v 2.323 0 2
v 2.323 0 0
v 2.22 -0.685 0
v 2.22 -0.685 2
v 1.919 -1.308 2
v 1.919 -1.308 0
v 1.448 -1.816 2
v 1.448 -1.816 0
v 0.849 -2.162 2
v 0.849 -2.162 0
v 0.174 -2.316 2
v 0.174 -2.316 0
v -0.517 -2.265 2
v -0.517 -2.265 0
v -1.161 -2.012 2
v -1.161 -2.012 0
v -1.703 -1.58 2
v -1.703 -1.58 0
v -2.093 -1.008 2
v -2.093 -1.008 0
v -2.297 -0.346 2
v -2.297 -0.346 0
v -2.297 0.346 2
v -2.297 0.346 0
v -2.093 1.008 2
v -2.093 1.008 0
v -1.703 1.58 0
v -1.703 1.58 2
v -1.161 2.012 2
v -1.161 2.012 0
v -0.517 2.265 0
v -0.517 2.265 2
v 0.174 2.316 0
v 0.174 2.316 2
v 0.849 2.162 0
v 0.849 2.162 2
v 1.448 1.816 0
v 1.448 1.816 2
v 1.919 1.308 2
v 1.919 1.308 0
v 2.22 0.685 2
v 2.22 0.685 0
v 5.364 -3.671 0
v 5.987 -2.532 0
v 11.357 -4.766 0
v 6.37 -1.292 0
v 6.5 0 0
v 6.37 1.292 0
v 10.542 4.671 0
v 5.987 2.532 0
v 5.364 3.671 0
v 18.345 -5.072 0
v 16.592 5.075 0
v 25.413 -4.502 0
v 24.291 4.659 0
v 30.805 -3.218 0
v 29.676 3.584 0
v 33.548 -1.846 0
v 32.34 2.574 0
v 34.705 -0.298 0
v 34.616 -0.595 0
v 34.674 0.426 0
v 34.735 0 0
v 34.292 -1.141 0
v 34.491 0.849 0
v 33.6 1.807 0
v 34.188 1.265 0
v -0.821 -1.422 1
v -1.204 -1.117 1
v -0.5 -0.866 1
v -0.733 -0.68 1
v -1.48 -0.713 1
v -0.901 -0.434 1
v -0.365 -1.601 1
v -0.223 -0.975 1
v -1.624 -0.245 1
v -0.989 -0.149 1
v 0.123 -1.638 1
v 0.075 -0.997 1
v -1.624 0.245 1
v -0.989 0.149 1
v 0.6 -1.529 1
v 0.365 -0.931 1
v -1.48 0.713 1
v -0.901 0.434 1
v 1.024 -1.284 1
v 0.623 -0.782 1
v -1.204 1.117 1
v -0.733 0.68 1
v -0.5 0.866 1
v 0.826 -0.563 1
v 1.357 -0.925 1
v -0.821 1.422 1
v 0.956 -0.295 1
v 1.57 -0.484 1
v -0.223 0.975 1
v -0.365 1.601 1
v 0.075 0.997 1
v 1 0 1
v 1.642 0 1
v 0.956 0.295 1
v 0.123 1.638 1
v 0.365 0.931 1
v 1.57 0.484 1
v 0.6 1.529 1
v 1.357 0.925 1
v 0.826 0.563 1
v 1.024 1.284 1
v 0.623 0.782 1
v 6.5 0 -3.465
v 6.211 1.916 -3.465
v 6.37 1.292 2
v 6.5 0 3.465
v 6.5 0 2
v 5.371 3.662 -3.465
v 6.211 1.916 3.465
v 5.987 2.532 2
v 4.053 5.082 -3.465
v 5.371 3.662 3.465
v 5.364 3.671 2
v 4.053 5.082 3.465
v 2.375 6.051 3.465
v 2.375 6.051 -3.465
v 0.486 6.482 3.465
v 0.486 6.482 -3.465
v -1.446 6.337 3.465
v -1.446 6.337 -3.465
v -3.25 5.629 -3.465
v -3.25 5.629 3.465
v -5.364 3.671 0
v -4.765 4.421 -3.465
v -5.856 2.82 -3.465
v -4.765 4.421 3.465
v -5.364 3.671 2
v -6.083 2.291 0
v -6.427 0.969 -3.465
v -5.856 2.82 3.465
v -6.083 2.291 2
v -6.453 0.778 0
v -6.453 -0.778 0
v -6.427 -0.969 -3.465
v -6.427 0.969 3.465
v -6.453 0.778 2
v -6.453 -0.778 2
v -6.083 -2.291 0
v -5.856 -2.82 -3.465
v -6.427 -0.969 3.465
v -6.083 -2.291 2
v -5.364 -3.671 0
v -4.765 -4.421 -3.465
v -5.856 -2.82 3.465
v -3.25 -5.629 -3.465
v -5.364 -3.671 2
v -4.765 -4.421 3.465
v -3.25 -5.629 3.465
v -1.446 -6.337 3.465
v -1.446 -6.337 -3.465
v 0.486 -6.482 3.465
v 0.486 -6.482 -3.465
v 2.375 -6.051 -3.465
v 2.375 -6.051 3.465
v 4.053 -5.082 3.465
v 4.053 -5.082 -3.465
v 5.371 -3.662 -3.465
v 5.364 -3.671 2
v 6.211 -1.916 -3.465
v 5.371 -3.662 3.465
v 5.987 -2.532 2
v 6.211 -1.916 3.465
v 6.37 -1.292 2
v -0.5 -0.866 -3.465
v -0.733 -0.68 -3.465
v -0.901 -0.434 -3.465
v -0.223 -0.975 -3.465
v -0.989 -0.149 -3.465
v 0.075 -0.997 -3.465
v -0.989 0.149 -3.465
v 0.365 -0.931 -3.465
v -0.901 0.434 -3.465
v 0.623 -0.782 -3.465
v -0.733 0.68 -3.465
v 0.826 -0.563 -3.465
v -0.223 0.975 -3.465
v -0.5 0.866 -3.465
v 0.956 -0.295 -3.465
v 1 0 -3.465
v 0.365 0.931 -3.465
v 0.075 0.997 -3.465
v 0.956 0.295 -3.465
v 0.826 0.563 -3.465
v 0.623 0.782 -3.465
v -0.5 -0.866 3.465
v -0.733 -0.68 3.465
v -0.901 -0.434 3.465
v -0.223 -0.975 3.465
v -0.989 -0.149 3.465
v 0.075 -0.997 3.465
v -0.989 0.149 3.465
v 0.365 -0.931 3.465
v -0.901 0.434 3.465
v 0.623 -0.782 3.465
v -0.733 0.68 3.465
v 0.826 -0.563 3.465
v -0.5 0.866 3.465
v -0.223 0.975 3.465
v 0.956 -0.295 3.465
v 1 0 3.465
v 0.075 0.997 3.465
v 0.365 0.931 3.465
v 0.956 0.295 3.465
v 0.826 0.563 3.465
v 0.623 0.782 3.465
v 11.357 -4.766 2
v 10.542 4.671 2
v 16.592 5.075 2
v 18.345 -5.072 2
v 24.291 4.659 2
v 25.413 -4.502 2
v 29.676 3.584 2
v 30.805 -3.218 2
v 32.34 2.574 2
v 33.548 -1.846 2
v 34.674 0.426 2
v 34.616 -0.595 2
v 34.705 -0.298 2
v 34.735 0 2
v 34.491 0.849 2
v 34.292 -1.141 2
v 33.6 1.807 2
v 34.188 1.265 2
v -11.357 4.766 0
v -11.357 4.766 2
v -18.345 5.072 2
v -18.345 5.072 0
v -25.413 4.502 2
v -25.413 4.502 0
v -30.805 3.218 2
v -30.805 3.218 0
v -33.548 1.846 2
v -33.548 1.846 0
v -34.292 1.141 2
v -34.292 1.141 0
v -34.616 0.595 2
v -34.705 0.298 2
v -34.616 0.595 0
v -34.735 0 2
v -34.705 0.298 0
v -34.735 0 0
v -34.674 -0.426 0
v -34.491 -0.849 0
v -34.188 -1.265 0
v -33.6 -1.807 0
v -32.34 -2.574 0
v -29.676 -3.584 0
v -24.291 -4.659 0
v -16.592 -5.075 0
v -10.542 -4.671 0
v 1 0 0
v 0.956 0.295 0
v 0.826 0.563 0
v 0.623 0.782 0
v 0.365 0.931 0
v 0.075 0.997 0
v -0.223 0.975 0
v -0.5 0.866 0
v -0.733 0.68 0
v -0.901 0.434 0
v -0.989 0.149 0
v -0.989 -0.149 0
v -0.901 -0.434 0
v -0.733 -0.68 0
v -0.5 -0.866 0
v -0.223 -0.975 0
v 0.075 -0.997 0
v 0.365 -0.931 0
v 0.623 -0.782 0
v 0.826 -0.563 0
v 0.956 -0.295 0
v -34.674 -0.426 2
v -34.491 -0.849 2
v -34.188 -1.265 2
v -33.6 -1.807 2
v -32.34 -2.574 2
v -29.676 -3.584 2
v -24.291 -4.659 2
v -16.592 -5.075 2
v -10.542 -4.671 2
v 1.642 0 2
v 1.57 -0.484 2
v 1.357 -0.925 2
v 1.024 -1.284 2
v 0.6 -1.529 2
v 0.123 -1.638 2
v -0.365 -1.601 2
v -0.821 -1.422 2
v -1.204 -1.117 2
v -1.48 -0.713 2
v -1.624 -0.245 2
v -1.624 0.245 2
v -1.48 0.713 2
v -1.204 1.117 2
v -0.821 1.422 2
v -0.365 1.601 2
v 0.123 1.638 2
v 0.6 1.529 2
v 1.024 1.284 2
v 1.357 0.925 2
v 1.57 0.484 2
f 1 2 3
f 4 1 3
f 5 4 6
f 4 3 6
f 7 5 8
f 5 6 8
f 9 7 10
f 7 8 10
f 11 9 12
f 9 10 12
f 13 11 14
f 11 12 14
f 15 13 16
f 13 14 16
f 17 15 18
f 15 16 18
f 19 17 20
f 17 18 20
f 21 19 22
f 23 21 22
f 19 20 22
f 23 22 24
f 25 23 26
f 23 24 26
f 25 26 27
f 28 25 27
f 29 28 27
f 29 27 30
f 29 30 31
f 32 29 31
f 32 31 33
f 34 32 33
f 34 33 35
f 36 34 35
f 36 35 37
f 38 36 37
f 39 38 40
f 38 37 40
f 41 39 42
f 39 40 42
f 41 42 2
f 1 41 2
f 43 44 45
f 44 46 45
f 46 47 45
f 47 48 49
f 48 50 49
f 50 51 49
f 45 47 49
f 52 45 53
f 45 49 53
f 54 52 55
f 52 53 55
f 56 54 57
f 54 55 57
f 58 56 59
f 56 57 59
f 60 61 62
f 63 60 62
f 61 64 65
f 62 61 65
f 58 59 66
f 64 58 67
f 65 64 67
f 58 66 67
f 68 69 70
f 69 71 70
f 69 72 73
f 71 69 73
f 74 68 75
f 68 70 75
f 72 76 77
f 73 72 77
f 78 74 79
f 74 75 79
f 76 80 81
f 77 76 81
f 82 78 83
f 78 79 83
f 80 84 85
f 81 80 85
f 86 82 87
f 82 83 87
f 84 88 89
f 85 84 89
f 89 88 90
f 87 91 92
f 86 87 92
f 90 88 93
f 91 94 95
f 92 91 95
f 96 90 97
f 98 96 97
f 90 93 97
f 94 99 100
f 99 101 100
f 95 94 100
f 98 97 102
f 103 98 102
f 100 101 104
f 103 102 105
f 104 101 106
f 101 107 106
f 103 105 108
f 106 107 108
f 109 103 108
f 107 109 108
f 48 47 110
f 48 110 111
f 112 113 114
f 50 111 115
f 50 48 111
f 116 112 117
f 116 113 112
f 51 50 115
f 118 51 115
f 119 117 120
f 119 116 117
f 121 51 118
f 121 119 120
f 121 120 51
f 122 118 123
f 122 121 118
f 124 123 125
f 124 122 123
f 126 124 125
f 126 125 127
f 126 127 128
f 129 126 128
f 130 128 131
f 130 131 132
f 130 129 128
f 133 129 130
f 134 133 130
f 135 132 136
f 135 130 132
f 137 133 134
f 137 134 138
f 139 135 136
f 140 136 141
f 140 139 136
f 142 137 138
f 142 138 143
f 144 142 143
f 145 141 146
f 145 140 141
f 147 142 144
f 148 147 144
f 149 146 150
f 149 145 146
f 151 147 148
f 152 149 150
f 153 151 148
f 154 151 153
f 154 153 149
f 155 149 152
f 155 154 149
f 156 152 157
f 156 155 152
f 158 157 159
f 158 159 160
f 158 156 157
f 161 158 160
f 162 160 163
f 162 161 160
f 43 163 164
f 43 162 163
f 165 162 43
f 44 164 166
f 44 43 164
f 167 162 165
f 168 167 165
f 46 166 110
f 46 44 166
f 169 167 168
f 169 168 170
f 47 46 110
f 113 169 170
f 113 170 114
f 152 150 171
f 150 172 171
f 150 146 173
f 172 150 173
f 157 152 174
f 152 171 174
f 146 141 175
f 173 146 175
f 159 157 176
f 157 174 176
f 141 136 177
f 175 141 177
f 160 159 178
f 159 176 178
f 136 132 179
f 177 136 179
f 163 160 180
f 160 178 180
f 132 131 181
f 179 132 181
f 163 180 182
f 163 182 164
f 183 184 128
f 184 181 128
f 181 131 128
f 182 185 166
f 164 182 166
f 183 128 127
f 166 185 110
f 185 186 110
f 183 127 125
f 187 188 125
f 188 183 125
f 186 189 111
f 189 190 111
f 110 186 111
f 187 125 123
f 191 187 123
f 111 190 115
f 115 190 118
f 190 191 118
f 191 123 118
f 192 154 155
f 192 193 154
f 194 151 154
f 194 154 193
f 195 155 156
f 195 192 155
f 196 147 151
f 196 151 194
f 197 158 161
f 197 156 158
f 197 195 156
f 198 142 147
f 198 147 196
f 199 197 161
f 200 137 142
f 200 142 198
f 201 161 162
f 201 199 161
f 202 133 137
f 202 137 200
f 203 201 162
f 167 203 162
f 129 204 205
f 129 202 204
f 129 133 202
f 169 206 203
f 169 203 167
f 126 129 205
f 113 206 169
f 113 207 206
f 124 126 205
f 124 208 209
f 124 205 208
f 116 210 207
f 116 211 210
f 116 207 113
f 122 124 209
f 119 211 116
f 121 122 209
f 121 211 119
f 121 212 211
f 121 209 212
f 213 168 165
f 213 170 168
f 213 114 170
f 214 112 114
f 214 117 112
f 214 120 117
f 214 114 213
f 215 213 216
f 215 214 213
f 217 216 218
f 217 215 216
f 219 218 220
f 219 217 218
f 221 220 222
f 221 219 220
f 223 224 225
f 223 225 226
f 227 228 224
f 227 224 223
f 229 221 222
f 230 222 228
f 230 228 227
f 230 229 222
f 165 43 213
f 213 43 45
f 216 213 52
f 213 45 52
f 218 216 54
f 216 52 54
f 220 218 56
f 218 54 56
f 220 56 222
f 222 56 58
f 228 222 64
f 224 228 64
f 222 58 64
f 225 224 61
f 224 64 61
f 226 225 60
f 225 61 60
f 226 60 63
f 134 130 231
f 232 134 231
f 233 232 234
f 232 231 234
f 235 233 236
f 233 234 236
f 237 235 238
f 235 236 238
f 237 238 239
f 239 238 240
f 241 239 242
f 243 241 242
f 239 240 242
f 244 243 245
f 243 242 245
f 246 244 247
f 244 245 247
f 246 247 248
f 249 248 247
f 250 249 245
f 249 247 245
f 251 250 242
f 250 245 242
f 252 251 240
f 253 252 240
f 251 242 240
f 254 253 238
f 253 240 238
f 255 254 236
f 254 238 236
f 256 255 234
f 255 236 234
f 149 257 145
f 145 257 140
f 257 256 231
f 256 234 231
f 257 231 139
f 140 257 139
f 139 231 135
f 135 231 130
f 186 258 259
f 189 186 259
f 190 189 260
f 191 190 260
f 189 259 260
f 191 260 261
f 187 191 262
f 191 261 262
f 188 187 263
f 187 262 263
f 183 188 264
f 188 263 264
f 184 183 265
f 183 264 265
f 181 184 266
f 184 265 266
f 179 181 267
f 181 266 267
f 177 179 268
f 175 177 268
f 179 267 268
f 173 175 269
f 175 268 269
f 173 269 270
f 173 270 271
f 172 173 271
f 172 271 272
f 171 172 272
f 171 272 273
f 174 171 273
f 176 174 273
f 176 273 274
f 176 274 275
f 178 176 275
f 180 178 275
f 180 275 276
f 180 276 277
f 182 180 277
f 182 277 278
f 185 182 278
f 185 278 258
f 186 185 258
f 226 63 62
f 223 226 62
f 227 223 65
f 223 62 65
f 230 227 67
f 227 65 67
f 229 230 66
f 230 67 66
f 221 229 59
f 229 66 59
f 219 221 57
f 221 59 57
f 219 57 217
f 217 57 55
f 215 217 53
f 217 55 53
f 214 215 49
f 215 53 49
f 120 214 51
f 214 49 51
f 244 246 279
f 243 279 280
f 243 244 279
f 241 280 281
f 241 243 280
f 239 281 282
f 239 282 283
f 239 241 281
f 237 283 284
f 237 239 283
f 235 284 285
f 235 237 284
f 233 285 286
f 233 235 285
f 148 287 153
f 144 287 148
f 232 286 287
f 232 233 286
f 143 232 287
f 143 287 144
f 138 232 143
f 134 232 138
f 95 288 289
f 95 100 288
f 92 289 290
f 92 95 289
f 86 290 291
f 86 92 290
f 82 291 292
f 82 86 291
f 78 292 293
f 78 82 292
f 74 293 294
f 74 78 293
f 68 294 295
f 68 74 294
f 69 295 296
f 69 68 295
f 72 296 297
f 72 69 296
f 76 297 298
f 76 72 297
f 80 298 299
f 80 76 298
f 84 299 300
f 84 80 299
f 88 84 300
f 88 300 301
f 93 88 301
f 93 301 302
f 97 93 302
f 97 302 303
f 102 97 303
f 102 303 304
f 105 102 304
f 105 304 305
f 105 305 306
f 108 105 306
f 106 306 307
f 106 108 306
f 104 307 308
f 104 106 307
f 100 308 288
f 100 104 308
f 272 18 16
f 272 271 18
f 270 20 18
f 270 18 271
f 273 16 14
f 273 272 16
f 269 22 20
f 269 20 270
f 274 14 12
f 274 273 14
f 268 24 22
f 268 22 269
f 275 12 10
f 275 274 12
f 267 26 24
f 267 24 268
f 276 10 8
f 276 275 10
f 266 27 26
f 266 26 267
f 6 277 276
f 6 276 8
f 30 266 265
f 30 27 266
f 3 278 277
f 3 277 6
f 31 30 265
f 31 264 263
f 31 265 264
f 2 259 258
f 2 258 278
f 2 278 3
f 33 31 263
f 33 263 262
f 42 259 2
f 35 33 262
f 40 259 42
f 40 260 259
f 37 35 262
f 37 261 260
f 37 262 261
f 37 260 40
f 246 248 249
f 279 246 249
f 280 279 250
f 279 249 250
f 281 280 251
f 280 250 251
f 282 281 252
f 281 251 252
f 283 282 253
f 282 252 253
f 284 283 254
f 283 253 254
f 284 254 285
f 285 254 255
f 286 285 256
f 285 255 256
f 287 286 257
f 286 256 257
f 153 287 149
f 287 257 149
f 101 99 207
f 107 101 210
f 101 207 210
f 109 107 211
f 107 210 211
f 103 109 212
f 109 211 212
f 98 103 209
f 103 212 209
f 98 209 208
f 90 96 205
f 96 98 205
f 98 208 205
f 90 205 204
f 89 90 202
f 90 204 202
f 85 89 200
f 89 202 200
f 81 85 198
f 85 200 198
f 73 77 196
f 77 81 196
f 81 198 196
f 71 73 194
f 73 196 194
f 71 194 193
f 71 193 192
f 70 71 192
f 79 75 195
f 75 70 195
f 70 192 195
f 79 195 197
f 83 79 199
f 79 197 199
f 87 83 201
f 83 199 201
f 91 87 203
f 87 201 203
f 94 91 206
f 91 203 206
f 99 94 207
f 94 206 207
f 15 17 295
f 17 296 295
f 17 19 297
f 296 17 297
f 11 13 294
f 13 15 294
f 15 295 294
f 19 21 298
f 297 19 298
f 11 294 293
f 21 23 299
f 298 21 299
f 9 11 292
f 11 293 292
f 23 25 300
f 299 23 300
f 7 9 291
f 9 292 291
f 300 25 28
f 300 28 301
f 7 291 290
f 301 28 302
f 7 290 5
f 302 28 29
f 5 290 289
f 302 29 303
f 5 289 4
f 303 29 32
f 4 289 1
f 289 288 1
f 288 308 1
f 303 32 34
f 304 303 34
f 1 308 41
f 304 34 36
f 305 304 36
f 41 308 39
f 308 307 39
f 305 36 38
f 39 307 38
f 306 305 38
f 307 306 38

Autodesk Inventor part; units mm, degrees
ref_plane "YZ Plane" through (0, 0, 0) normal (1, 0, 0) x (0, 1, 0)
ref_plane "XZ Plane" through (0, 0, 0) normal (0, 1, 0) x (-1, 0, 0)
ref_plane "XY Plane" through (0, 0, 0) normal (0, 0, 1) x (1, 0, 0)
sketch "Sketch1" plane through (0, 0, 0) normal (0, 0, 1) x (1, 0, 0)
  circle A0 centre (0, 0) radius 6.5
  ellipse E0 centre (17.3675, 0) end of major axis (34.735, 0) minor radius 5.08
  line L0 (0, 30.8967) -> (0, 25.9123)
  ellipse E1 centre (-17.3675, 0) end of major axis (-34.735, 0) minor radius 5.08
  circle A1 centre (0, 0) radius 1
  circle A2 centre (0, 0) radius 1.6425
  circle A3 centre (0, 0) radius 2.3228
  dimension "d1" = 17.3675
  dimension "d2" = 5.08
  dimension "d0" = 13
  dimension "d7" = 2
extrude "Extrusion1" add sketch "Sketch1" along normal mid plane 6.93 contours A0 E0 A3 | E0 A3 E1 A0 | A0 E1 A3 E0 | E1 A3 A0 | A3 E0 A2 | E0 A2 E1 A3 | A3 E1 A2 E0 | E1 A2 A3 | A2 E0 A1 | E0 A1 E1 A2 | A2 E1 A1 E0 | E1 A1 A2 | A1 E0 | E0 E1 A1 | A1 E1 E0 | E1 A1
extrude "Extrusion2" add sketch "Sketch1" along normal blind 2 contours A0 E0 A3 | A0 E0 | E1 A3 A0 | A0 E1 | A3 E0 A2 | E1 A2 A3 | A2 E0 A1 | E1 A1 A2 | A1 E0 | E1 A1
extrude "Extrusion3" cut sketch "Sketch1" along normal through all both and the other way through all contours A1 E0 | E0 E1 A1 | A1 E1 E0 | E1 A1
extrude "Extrusion4" cut sketch "Sketch1" along normal blind 1 contours A2 E0 A1 | E0 A1 E1 A2 | A2 E1 A1 E0 | E1 A1 A2
extrude "Extrusion5" cut sketch "Sketch1" along normal blind 2 contours A3 E0 A2 | E0 A2 E1 A3 | A3 E1 A2 E0 | E1 A2 A3
sketch "Sketch2" plane through (0, 0, 2) normal (0, 0, 1) x (1, 0, 0)
  point P0 (0, 0)
properties part number "Baling2"
